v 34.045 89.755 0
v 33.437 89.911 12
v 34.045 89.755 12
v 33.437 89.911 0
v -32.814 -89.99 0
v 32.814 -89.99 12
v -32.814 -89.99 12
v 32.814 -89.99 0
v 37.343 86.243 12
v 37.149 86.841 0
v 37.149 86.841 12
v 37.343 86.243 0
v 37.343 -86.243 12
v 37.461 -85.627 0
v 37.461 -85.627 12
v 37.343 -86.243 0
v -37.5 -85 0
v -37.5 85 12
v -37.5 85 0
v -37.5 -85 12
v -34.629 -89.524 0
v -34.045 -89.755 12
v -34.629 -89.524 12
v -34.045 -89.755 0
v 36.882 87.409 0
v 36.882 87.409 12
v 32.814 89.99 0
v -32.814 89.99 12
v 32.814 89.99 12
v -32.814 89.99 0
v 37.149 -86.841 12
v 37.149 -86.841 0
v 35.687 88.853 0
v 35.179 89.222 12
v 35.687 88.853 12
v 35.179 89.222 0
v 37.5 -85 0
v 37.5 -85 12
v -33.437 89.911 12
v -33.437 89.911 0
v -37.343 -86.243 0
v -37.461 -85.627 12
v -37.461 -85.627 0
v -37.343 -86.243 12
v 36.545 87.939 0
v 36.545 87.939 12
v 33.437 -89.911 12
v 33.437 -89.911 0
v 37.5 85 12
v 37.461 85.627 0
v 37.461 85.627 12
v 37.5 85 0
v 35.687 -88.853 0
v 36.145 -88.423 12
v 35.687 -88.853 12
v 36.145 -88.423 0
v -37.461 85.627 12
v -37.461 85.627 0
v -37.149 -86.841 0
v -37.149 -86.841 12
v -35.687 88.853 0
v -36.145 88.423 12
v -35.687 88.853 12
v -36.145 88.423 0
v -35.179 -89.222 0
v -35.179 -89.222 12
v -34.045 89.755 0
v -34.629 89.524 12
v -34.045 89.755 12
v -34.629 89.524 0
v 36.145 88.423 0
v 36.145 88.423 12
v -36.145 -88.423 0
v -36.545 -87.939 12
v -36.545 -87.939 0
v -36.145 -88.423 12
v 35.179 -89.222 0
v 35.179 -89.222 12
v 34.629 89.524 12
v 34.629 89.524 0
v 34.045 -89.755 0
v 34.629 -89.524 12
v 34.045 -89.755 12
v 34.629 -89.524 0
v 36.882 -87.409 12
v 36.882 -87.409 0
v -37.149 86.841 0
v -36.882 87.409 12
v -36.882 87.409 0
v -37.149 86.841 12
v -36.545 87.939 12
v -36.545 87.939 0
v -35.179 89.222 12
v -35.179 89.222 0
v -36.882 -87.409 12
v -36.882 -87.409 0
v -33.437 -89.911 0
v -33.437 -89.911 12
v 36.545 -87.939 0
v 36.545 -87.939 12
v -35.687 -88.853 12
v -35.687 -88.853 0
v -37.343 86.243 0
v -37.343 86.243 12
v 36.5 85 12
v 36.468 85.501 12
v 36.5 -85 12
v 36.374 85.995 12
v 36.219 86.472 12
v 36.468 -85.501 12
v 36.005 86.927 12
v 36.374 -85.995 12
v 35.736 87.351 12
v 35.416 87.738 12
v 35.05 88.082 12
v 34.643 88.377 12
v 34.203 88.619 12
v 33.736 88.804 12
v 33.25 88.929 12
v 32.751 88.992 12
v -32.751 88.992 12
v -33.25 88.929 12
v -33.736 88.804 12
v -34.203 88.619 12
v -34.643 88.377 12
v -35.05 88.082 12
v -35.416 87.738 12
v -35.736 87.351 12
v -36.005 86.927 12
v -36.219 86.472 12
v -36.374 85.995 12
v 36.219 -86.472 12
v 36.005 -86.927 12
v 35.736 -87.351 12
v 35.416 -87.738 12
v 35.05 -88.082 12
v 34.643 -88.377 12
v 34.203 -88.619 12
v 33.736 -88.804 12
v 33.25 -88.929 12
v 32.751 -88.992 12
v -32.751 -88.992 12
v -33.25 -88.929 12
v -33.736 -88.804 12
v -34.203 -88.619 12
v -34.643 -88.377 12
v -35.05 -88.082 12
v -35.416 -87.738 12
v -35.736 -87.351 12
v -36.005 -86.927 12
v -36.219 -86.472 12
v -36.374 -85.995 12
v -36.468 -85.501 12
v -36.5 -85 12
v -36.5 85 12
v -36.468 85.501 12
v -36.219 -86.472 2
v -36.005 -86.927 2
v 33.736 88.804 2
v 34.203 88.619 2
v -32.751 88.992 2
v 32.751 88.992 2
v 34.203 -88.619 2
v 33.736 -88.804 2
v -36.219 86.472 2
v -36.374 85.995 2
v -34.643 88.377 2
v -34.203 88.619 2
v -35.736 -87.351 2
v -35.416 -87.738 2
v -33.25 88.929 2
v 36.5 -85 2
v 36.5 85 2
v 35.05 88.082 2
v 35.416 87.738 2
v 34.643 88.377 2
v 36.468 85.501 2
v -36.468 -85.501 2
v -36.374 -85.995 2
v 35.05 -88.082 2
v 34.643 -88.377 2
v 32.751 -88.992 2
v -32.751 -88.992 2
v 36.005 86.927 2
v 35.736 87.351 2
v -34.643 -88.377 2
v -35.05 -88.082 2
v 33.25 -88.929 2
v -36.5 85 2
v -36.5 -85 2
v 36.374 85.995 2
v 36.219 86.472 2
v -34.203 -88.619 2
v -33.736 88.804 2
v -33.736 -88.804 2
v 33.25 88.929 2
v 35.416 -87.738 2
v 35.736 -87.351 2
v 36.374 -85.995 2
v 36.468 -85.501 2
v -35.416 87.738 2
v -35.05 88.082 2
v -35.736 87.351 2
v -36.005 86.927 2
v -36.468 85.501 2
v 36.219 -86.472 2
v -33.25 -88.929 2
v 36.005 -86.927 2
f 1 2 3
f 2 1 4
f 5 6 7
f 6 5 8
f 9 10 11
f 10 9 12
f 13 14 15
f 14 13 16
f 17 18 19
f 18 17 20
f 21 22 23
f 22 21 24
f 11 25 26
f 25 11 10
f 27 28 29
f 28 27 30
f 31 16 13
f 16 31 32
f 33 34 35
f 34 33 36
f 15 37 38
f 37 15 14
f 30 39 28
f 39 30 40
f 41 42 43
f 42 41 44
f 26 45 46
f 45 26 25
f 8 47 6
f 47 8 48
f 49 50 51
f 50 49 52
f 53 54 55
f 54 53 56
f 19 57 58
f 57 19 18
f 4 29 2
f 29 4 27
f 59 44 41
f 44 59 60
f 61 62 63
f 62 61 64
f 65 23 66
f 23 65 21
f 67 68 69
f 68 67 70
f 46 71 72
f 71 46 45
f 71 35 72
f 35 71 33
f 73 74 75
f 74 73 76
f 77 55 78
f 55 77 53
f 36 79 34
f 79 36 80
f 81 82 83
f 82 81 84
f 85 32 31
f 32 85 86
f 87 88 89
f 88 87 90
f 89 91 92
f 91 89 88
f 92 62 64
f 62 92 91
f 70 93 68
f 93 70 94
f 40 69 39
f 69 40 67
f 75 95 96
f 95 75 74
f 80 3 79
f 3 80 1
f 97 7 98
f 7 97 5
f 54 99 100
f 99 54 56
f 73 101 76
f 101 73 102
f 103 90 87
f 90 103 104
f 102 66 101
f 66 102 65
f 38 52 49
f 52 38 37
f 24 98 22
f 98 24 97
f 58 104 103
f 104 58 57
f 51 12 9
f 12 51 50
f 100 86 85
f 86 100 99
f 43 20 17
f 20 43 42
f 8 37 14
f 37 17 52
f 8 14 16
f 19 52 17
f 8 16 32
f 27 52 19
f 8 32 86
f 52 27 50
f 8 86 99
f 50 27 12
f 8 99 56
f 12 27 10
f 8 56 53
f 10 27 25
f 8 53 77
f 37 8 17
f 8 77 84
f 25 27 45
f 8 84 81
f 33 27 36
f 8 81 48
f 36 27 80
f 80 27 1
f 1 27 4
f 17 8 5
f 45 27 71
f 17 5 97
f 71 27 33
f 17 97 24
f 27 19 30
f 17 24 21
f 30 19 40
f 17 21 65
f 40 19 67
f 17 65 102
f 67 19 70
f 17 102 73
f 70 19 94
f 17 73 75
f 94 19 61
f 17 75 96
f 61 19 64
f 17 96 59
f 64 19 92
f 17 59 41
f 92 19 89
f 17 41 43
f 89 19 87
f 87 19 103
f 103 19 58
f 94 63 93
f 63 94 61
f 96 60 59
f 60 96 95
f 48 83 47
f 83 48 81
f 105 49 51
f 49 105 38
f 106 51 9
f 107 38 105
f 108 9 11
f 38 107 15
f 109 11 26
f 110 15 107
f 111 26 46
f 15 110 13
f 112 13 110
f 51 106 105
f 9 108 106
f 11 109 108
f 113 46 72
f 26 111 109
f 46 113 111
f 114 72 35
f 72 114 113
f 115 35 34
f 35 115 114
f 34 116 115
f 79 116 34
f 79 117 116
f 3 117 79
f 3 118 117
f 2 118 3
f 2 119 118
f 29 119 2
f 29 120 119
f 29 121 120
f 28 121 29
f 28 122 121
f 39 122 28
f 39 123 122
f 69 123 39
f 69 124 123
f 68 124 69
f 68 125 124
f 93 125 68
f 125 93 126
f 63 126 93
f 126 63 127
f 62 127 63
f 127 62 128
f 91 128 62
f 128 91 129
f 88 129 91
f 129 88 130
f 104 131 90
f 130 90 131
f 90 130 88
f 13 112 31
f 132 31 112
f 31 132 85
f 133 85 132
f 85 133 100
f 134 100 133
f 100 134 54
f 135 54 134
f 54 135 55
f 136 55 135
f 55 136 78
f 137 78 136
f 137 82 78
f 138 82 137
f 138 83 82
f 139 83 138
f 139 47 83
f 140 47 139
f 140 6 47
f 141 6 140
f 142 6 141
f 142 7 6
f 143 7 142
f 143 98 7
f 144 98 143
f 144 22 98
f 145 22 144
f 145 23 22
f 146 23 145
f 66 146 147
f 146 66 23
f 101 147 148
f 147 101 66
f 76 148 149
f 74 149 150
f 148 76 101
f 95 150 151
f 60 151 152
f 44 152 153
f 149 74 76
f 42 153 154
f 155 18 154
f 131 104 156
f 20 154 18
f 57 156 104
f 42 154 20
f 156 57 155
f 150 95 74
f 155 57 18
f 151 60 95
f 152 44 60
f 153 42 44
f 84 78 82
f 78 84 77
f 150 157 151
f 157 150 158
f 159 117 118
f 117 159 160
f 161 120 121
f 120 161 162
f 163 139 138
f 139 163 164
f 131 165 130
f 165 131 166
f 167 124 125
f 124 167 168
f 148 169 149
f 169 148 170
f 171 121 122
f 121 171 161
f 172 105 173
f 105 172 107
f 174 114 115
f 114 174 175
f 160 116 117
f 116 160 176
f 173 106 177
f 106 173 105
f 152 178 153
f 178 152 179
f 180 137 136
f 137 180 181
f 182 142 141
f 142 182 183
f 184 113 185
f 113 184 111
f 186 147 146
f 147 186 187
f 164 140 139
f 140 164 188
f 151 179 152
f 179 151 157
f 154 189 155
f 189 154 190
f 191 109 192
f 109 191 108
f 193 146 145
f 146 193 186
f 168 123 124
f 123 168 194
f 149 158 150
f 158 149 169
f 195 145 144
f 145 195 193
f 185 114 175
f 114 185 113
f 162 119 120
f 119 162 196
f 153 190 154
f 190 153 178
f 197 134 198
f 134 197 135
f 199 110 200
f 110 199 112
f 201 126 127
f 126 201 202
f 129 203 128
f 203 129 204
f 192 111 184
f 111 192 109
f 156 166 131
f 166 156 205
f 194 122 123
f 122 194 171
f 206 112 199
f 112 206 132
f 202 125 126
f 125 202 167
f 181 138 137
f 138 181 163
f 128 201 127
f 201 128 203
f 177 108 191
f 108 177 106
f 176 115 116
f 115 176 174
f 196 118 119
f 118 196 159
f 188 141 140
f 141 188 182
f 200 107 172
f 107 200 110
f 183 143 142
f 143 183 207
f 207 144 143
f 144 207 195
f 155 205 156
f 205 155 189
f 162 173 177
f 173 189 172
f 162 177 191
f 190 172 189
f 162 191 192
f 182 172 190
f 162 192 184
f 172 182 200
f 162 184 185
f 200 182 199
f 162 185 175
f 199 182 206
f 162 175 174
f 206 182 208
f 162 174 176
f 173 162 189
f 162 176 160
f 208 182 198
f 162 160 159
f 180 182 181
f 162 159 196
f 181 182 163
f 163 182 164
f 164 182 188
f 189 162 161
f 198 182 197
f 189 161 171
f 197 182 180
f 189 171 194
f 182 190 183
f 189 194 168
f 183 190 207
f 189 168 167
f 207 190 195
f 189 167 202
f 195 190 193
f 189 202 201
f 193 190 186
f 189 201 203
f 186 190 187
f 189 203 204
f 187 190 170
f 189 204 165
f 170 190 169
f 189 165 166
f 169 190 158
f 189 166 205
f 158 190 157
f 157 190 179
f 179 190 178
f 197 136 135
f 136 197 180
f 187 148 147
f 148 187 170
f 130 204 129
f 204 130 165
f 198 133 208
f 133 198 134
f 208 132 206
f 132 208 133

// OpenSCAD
$fn = 50;


difference() {
	union() {
		hull() {
			translate(v = [-32.5000000000, 85.0000000000, 0]) {
				cylinder(h = 12, r = 5);
			}
			translate(v = [32.5000000000, 85.0000000000, 0]) {
				cylinder(h = 12, r = 5);
			}
			translate(v = [-32.5000000000, -85.0000000000, 0]) {
				cylinder(h = 12, r = 5);
			}
			translate(v = [32.5000000000, -85.0000000000, 0]) {
				cylinder(h = 12, r = 5);
			}
		}
	}
	union() {
		translate(v = [0, 0, 2]) {
			hull() {
				translate(v = [-32.5000000000, 85.0000000000, 0]) {
					cylinder(h = 10, r = 4);
				}
				translate(v = [32.5000000000, 85.0000000000, 0]) {
					cylinder(h = 10, r = 4);
				}
				translate(v = [-32.5000000000, -85.0000000000, 0]) {
					cylinder(h = 10, r = 4);
				}
				translate(v = [32.5000000000, -85.0000000000, 0]) {
					cylinder(h = 10, r = 4);
				}
			}
		}
	}
}
